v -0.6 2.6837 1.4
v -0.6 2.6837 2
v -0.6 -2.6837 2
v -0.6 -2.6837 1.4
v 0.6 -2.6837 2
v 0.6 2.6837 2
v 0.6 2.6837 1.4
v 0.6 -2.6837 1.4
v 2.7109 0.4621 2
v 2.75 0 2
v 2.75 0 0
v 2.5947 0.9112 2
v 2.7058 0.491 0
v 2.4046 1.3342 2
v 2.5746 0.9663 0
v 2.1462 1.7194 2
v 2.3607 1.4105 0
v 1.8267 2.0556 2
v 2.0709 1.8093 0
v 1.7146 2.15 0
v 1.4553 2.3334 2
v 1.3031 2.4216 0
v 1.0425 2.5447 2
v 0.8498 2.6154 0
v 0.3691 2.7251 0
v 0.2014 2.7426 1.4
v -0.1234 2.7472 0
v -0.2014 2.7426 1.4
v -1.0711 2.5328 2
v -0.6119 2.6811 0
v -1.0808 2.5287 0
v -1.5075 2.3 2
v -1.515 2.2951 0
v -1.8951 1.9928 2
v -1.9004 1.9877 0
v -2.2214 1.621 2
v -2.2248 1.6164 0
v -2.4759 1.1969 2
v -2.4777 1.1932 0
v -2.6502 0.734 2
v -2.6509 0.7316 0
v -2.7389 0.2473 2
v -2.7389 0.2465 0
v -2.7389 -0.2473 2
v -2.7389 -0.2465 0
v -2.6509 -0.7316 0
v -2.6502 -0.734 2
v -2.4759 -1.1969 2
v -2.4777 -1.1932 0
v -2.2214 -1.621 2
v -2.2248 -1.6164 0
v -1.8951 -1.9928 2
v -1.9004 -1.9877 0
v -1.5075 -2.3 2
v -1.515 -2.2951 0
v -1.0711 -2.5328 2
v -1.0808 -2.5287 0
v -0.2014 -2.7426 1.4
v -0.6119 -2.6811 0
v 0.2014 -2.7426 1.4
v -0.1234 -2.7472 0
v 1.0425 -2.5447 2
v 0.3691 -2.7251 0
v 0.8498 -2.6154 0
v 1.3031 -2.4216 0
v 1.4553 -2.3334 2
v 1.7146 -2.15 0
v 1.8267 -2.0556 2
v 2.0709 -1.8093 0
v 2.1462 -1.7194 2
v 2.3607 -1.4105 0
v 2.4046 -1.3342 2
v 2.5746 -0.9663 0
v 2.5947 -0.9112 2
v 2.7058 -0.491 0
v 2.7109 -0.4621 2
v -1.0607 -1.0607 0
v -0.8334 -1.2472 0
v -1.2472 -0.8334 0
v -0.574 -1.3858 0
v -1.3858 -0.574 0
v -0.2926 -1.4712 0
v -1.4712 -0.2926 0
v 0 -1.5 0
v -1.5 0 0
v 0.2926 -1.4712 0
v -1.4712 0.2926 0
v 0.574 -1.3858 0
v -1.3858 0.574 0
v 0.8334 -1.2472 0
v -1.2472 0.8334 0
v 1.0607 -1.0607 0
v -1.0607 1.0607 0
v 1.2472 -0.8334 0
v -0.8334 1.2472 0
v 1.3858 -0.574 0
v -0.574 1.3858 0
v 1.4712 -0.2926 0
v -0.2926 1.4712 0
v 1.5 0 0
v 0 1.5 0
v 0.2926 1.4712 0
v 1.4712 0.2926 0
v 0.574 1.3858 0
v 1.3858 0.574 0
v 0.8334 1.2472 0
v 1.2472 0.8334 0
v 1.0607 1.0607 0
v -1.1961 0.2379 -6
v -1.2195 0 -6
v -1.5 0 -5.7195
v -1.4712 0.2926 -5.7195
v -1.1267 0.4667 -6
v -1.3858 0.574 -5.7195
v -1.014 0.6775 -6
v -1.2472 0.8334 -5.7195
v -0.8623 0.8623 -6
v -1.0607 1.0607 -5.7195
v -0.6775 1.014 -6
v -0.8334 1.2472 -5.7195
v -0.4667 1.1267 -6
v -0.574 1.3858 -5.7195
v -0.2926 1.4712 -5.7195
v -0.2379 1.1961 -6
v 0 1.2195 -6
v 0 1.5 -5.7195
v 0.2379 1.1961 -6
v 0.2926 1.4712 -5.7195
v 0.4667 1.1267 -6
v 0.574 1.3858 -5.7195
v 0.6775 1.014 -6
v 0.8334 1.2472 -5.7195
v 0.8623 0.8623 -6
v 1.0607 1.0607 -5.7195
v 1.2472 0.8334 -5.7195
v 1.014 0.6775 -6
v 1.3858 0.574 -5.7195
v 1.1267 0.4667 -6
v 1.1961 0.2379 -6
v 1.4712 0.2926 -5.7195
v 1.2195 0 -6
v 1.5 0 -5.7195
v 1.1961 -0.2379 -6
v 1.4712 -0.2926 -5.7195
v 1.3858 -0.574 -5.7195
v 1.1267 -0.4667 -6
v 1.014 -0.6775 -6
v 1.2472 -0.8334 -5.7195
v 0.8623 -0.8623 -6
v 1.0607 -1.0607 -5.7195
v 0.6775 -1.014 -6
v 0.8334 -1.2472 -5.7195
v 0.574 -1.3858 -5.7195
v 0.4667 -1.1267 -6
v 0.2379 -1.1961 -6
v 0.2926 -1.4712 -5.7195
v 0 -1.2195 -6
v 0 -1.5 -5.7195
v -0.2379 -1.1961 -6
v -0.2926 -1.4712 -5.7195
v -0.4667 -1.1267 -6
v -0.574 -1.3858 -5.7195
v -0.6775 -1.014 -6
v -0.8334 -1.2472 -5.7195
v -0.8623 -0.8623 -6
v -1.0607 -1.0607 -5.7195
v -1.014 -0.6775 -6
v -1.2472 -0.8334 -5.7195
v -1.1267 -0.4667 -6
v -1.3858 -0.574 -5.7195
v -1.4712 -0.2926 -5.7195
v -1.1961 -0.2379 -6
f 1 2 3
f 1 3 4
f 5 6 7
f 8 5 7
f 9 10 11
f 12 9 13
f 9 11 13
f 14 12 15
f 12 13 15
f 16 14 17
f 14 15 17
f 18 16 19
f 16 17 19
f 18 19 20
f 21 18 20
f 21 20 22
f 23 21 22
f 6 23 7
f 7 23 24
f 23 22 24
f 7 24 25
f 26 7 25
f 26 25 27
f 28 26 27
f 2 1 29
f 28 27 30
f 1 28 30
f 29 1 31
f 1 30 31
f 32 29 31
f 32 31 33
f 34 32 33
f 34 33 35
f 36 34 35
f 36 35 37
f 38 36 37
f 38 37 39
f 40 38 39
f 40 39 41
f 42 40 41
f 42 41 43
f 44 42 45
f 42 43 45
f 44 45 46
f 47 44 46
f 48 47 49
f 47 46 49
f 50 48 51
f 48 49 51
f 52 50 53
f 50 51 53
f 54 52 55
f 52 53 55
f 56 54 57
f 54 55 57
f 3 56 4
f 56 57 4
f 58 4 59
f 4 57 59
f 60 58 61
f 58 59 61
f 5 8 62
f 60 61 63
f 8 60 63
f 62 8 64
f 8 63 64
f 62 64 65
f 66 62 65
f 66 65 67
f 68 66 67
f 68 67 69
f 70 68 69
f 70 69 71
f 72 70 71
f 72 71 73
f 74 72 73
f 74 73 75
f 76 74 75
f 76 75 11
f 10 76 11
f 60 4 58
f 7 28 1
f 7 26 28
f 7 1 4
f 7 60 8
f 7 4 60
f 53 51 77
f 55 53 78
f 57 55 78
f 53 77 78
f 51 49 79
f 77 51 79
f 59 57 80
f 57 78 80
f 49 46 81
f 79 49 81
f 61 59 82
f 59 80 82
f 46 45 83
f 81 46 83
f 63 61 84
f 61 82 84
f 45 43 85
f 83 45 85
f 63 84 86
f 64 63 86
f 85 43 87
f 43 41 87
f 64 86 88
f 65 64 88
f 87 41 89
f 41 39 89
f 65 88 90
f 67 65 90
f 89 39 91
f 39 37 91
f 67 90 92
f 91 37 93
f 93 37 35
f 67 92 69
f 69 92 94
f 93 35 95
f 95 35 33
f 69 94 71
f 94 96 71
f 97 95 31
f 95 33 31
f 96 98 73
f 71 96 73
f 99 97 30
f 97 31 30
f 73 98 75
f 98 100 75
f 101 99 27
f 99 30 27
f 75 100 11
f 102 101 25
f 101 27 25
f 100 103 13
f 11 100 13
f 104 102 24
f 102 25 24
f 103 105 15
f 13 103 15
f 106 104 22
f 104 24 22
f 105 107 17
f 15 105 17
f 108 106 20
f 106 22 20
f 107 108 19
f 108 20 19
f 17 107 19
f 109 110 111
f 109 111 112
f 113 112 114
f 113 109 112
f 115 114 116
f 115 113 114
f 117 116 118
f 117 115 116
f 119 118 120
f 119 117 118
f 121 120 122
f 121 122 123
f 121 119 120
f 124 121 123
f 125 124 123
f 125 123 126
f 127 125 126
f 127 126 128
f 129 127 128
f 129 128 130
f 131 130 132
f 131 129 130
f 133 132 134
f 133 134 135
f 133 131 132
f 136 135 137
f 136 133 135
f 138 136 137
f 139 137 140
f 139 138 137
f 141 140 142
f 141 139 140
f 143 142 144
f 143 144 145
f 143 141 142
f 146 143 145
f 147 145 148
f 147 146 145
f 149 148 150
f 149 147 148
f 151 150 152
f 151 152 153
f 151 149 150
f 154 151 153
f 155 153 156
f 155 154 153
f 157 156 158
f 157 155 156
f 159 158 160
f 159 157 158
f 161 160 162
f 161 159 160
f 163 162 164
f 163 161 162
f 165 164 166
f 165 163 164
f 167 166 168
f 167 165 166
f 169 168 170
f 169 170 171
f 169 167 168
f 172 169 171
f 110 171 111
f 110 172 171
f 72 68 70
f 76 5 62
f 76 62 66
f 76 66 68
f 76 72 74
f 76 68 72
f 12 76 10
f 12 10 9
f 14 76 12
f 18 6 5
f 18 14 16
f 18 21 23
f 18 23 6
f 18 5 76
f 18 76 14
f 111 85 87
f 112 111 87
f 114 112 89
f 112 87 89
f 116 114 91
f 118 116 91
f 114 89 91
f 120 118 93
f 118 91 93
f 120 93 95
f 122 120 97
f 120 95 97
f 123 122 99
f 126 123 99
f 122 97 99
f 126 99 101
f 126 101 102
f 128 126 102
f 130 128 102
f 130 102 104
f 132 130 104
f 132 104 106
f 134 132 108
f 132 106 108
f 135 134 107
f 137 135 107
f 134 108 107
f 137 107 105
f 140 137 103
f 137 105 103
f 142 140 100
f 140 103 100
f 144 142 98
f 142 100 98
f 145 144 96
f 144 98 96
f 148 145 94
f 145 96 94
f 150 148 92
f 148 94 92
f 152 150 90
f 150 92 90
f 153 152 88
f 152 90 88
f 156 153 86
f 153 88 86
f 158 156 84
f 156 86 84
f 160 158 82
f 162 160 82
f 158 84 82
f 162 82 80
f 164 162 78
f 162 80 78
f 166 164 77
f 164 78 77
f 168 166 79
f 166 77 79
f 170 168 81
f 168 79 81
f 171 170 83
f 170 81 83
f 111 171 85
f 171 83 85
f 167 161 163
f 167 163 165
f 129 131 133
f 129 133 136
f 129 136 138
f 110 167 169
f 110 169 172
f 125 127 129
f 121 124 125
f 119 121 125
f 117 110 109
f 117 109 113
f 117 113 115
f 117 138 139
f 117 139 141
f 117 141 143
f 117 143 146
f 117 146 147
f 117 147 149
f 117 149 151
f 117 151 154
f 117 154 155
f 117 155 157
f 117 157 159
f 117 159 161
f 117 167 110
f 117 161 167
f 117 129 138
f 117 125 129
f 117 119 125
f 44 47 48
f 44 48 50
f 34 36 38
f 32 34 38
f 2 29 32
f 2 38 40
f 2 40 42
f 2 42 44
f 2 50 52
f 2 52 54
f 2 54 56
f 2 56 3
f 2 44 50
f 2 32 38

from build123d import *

# Parameters (mm, degrees)
SKETCH_1_R               = 2.75
EXTRUDE_1_DEPTH          = 2
SKETCH_2_R               = 1.5
EXTRUDE_2_DEPTH          = 6
CHAMFER_1_SIZE           = 0.2805
CUT_EXTRUDE_1_DEPTH      = 38
CUT_EXTRUDE_1_DEPTH_BACK = 38
SKETCH_3_W               = 1.2
SKETCH_3_H               = 1.2


with BuildPart() as part:
    # Эскиз1 → Бобышка-Вытянуть1 (new body)
    with BuildSketch(Plane.XY):
        Circle(SKETCH_1_R)
    extrude(amount=EXTRUDE_1_DEPTH)

    # Эскиз2 → Бобышка-Вытянуть2 (add)
    with BuildSketch(Plane(origin=(0, 0, 0), x_dir=(-1, 0, 0), z_dir=(0, 0, -1))):
        Circle(SKETCH_2_R)
    extrude(amount=EXTRUDE_2_DEPTH)

    # Фаска1
    chamfer_1_edges = [part.edges().sort_by_distance(p)[0] for p in [
        (1.5, 0, -6),
    ]]
    chamfer(chamfer_1_edges, length=CHAMFER_1_SIZE)

    # Эскиз3 → Вырез-Вытянуть1 (cut, two sides: drawn at the far end of the back side and taken through both)
    with BuildSketch(Plane(origin=(0, 0, 0), x_dir=(1, 0, 0), z_dir=(0, 1, 0)).offset(-CUT_EXTRUDE_1_DEPTH_BACK)):
        with Locations((0, -2)):
            Rectangle(SKETCH_3_W, SKETCH_3_H)
    extrude(amount=CUT_EXTRUDE_1_DEPTH + CUT_EXTRUDE_1_DEPTH_BACK, mode=Mode.SUBTRACT)


solid = part.part
